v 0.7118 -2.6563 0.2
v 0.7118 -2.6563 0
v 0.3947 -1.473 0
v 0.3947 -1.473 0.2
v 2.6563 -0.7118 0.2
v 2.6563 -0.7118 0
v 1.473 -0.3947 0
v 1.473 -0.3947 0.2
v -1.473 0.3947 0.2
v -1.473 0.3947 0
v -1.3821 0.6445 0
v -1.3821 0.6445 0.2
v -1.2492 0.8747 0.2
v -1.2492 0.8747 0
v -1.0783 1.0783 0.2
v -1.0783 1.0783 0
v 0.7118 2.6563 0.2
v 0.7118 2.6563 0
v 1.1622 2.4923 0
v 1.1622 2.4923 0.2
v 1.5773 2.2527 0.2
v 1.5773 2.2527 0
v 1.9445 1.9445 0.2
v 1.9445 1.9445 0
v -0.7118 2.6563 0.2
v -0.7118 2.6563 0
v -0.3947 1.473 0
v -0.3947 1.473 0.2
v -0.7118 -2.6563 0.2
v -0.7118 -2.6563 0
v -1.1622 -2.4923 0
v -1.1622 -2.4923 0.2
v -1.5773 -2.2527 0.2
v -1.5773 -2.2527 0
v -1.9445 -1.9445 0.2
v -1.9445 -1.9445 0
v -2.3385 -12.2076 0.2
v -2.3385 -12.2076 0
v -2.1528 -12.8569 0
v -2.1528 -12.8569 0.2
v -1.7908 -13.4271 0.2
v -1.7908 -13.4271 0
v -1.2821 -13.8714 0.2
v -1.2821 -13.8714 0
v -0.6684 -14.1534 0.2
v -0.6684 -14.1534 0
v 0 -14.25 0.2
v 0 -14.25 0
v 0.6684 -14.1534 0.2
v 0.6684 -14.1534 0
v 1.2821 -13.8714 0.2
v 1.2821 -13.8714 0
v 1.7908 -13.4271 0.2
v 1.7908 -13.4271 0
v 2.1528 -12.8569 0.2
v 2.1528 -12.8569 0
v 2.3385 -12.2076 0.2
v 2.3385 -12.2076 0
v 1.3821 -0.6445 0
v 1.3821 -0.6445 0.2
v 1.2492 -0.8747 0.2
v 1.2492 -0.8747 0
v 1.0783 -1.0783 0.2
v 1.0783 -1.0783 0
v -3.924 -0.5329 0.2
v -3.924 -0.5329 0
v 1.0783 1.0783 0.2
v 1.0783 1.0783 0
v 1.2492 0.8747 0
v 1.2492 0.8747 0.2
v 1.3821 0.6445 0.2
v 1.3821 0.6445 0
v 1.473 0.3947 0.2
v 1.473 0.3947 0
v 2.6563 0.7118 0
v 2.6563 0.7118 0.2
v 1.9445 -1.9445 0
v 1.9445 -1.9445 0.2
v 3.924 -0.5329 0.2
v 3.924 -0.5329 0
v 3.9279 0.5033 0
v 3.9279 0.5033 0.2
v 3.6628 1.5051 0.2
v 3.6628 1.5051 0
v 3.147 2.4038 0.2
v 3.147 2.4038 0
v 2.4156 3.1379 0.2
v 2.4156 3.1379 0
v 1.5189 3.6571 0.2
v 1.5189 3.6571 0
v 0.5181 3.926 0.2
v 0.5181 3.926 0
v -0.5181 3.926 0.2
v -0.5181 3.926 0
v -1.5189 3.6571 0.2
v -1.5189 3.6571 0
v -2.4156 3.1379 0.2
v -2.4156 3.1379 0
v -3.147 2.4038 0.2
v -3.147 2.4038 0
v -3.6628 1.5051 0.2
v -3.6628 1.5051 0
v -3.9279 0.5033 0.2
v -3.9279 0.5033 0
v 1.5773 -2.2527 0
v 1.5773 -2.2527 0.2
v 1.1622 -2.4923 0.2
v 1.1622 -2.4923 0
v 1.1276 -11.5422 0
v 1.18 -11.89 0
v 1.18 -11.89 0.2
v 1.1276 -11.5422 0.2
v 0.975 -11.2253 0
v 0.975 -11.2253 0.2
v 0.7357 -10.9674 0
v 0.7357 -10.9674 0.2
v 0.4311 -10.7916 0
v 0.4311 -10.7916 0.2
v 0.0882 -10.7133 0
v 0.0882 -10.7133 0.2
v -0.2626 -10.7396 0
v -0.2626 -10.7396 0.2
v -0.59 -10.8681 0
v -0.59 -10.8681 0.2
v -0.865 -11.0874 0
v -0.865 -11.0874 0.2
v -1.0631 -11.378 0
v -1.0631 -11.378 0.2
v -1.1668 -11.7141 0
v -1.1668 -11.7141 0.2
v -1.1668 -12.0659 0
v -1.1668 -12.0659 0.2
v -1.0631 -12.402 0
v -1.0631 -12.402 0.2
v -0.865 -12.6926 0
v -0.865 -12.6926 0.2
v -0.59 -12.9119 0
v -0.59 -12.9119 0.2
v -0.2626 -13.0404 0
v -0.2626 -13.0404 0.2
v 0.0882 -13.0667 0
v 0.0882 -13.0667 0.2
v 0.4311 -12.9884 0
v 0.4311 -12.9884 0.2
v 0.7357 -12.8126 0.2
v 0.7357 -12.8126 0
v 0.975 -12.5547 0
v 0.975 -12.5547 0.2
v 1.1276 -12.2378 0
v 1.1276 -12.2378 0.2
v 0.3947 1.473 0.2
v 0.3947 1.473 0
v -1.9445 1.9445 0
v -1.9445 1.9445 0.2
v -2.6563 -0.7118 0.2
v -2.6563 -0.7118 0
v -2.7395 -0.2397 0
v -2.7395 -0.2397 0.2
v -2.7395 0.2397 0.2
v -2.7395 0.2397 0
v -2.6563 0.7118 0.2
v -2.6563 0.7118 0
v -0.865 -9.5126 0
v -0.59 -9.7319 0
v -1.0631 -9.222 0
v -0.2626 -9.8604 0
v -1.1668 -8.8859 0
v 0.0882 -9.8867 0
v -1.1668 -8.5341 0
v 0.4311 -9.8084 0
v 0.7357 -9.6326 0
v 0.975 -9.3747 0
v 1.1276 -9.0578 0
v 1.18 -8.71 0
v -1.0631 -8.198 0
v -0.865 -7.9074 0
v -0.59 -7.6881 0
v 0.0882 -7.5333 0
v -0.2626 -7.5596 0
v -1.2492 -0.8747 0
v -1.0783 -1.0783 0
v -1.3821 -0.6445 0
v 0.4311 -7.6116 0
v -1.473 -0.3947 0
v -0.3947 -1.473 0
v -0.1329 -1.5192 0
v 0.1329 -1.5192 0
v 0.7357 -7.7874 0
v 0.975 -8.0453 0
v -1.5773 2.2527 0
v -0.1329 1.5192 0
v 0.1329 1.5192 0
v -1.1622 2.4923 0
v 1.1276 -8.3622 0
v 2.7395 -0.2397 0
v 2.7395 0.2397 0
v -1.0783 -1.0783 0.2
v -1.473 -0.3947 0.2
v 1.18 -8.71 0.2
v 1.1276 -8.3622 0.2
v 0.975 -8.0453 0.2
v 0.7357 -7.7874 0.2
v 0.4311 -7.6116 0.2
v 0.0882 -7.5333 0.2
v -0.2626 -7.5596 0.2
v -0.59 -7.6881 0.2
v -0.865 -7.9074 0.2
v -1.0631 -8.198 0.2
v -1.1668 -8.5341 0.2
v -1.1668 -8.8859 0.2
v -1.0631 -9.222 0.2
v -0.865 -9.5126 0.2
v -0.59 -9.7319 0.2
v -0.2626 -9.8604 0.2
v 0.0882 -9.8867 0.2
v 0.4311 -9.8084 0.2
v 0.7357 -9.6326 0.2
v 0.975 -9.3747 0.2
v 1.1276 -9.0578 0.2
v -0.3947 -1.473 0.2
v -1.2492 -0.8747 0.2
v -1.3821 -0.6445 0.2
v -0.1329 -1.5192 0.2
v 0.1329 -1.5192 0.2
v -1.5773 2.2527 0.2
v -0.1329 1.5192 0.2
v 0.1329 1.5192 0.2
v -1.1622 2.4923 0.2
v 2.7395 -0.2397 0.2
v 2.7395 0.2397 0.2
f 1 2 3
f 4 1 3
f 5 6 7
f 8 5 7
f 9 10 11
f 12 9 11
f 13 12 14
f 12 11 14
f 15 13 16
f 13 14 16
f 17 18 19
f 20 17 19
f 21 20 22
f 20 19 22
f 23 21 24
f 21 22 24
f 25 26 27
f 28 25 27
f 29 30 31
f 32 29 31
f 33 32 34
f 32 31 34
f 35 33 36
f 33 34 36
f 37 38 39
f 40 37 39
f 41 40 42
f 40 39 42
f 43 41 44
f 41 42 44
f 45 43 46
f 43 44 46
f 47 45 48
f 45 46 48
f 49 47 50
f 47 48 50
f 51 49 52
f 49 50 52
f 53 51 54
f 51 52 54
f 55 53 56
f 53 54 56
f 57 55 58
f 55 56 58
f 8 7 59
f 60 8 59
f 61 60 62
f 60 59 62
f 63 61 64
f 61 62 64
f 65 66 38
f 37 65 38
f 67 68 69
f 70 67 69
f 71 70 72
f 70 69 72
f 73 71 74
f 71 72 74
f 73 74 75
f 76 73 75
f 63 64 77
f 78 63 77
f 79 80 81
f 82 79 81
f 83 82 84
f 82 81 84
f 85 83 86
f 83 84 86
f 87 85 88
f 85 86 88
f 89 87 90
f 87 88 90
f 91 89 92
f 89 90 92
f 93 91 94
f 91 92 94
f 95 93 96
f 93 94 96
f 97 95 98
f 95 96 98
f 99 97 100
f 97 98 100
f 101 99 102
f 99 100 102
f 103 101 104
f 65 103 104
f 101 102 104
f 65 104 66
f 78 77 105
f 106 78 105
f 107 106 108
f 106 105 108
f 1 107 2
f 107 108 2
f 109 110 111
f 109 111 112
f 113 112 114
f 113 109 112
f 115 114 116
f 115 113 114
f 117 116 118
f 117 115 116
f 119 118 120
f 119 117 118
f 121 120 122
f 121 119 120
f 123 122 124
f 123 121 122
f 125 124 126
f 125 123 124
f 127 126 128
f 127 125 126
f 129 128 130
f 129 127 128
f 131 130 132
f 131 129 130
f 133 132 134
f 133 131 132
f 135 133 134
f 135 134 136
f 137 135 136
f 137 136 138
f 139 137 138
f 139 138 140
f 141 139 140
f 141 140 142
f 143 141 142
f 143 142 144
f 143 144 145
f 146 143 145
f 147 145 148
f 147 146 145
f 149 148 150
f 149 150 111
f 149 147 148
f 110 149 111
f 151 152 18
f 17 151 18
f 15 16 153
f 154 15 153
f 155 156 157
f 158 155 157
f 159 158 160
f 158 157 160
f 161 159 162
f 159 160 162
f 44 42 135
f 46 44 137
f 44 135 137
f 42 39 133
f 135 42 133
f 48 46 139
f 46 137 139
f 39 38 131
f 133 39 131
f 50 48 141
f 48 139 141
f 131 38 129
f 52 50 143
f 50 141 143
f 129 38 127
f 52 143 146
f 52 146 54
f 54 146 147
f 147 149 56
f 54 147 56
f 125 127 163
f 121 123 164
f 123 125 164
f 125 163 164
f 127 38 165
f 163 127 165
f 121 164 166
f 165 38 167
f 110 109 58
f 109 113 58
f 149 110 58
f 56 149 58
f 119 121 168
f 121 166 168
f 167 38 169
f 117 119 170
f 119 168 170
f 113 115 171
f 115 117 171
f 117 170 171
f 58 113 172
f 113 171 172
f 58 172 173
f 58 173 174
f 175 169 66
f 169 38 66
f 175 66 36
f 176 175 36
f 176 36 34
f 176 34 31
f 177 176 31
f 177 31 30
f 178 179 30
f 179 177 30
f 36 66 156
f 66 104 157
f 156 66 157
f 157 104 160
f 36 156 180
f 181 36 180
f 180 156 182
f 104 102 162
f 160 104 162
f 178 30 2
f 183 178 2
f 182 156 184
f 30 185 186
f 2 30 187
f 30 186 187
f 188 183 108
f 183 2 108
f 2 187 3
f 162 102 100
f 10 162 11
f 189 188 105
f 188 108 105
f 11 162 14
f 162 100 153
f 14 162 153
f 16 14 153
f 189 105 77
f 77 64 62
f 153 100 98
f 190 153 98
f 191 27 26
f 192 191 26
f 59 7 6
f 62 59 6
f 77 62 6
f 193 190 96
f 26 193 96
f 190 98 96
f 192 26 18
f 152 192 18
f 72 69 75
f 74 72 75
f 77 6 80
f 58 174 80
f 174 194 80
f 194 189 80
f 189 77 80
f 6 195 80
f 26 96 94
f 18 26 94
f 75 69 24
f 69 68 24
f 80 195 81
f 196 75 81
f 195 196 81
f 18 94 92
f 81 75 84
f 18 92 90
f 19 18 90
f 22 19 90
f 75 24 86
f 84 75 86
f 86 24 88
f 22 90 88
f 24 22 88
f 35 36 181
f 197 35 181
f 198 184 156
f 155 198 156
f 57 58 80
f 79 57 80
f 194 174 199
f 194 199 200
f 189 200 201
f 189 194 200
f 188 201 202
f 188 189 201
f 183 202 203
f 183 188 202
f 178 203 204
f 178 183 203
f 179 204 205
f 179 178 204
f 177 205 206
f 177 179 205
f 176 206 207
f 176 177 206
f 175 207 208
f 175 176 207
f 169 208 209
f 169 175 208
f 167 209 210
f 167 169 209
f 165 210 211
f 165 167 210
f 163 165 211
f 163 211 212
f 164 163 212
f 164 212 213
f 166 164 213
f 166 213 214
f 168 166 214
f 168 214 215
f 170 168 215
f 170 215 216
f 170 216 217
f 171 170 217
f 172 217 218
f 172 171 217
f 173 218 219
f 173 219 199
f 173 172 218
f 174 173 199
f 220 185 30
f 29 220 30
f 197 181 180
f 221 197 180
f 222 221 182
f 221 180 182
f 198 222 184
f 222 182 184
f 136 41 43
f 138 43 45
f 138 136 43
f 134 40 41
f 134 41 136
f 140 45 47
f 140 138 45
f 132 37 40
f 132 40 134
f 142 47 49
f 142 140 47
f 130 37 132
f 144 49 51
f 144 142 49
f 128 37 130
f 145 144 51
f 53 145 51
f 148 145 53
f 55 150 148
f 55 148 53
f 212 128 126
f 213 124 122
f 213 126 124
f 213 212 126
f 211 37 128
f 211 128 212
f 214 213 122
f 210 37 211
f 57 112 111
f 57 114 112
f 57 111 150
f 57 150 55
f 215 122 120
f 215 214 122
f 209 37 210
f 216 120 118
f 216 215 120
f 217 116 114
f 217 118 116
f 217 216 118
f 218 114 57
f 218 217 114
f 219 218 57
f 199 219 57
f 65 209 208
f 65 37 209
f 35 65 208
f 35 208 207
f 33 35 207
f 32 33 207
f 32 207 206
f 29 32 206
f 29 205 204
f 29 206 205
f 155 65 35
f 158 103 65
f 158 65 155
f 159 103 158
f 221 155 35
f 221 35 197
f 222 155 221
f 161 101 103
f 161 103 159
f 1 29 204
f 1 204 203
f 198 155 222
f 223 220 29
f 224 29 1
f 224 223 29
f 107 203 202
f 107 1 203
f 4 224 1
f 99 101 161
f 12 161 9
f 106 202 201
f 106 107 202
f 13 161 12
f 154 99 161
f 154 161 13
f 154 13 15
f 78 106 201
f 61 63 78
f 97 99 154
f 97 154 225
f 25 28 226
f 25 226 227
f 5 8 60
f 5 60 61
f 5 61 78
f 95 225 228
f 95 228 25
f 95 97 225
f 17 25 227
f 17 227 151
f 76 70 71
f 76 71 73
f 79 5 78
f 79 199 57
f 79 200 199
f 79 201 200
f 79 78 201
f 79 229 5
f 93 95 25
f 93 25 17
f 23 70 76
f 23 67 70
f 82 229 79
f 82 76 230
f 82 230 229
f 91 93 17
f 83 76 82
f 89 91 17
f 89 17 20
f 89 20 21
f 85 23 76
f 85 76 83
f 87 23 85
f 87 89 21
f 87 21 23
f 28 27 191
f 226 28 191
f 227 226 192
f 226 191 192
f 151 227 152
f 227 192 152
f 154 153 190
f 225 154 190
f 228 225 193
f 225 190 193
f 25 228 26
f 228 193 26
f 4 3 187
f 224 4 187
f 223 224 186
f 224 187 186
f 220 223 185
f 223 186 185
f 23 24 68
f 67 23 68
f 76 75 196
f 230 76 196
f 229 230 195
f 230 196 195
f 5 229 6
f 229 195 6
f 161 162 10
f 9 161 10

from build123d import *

# Parameters (mm, degrees)
F0_R     = 1.18
F1_DEPTH = 0.2


with BuildPart() as f1:
    # F0 (on Top) → F1 (new body)
    with BuildSketch(Plane.XY):
        with BuildLine():
            Line((2.338535, -12.207578), (3.923982, -0.532885))
            ThreePointArc((3.923982, -0.532885), (0, 3.96), (-3.923982, -0.532885))
            Line((-3.923982, -0.532885), (-2.338535, -12.207578))
            ThreePointArc((-2.338535, -12.207578), (0, -14.25), (2.338535, -12.207578))
        make_face()
        with Locations((0, -11.89)):
            Circle(F0_R, mode=Mode.SUBTRACT)
        with Locations((0, -8.71)):
            Circle(F0_R, mode=Mode.SUBTRACT)
        with BuildLine():
            ThreePointArc((-1.078338, -1.078338), (-1.320689, -0.7625), (-1.473037, -0.394699))
            Line((-1.473037, -0.394699), (-2.656296, -0.711752))
            ThreePointArc((-2.656296, -0.711752), (-2.75, 0), (-2.656296, 0.711752))
            Line((-2.656296, 0.711752), (-1.473037, 0.394699))
            ThreePointArc((-1.473037, 0.394699), (-1.320689, 0.7625), (-1.078338, 1.078338))
            Line((-1.078338, 1.078338), (-1.944544, 1.944544))
            ThreePointArc((-1.944544, 1.944544), (-1.375, 2.38157), (-0.711752, 2.656296))
            Line((-0.711752, 2.656296), (-0.394699, 1.473037))
            ThreePointArc((-0.394699, 1.473037), (0, 1.525), (0.394699, 1.473037))
            Line((0.394699, 1.473037), (0.711752, 2.656296))
            ThreePointArc((0.711752, 2.656296), (1.375, 2.38157), (1.944544, 1.944544))
            Line((1.944544, 1.944544), (1.078338, 1.078338))
            ThreePointArc((1.078338, 1.078338), (1.320689, 0.7625), (1.473037, 0.394699))
            Line((1.473037, 0.394699), (2.656296, 0.711752))
            ThreePointArc((2.656296, 0.711752), (2.75, 0), (2.656296, -0.711752))
            Line((2.656296, -0.711752), (1.473037, -0.394699))
            ThreePointArc((1.473037, -0.394699), (1.320689, -0.7625), (1.078338, -1.078338))
            Line((1.078338, -1.078338), (1.944544, -1.944544))
            ThreePointArc((1.944544, -1.944544), (1.375, -2.38157), (0.711752, -2.656296))
            Line((0.711752, -2.656296), (0.394699, -1.473037))
            ThreePointArc((0.394699, -1.473037), (0, -1.525), (-0.394699, -1.473037))
            Line((-0.394699, -1.473037), (-0.711752, -2.656296))
            ThreePointArc((-0.711752, -2.656296), (-1.375, -2.38157), (-1.944544, -1.944544))
            Line((-1.944544, -1.944544), (-1.078338, -1.078338))
        make_face(mode=Mode.SUBTRACT)
    extrude(amount=F1_DEPTH)


solid = f1.part
